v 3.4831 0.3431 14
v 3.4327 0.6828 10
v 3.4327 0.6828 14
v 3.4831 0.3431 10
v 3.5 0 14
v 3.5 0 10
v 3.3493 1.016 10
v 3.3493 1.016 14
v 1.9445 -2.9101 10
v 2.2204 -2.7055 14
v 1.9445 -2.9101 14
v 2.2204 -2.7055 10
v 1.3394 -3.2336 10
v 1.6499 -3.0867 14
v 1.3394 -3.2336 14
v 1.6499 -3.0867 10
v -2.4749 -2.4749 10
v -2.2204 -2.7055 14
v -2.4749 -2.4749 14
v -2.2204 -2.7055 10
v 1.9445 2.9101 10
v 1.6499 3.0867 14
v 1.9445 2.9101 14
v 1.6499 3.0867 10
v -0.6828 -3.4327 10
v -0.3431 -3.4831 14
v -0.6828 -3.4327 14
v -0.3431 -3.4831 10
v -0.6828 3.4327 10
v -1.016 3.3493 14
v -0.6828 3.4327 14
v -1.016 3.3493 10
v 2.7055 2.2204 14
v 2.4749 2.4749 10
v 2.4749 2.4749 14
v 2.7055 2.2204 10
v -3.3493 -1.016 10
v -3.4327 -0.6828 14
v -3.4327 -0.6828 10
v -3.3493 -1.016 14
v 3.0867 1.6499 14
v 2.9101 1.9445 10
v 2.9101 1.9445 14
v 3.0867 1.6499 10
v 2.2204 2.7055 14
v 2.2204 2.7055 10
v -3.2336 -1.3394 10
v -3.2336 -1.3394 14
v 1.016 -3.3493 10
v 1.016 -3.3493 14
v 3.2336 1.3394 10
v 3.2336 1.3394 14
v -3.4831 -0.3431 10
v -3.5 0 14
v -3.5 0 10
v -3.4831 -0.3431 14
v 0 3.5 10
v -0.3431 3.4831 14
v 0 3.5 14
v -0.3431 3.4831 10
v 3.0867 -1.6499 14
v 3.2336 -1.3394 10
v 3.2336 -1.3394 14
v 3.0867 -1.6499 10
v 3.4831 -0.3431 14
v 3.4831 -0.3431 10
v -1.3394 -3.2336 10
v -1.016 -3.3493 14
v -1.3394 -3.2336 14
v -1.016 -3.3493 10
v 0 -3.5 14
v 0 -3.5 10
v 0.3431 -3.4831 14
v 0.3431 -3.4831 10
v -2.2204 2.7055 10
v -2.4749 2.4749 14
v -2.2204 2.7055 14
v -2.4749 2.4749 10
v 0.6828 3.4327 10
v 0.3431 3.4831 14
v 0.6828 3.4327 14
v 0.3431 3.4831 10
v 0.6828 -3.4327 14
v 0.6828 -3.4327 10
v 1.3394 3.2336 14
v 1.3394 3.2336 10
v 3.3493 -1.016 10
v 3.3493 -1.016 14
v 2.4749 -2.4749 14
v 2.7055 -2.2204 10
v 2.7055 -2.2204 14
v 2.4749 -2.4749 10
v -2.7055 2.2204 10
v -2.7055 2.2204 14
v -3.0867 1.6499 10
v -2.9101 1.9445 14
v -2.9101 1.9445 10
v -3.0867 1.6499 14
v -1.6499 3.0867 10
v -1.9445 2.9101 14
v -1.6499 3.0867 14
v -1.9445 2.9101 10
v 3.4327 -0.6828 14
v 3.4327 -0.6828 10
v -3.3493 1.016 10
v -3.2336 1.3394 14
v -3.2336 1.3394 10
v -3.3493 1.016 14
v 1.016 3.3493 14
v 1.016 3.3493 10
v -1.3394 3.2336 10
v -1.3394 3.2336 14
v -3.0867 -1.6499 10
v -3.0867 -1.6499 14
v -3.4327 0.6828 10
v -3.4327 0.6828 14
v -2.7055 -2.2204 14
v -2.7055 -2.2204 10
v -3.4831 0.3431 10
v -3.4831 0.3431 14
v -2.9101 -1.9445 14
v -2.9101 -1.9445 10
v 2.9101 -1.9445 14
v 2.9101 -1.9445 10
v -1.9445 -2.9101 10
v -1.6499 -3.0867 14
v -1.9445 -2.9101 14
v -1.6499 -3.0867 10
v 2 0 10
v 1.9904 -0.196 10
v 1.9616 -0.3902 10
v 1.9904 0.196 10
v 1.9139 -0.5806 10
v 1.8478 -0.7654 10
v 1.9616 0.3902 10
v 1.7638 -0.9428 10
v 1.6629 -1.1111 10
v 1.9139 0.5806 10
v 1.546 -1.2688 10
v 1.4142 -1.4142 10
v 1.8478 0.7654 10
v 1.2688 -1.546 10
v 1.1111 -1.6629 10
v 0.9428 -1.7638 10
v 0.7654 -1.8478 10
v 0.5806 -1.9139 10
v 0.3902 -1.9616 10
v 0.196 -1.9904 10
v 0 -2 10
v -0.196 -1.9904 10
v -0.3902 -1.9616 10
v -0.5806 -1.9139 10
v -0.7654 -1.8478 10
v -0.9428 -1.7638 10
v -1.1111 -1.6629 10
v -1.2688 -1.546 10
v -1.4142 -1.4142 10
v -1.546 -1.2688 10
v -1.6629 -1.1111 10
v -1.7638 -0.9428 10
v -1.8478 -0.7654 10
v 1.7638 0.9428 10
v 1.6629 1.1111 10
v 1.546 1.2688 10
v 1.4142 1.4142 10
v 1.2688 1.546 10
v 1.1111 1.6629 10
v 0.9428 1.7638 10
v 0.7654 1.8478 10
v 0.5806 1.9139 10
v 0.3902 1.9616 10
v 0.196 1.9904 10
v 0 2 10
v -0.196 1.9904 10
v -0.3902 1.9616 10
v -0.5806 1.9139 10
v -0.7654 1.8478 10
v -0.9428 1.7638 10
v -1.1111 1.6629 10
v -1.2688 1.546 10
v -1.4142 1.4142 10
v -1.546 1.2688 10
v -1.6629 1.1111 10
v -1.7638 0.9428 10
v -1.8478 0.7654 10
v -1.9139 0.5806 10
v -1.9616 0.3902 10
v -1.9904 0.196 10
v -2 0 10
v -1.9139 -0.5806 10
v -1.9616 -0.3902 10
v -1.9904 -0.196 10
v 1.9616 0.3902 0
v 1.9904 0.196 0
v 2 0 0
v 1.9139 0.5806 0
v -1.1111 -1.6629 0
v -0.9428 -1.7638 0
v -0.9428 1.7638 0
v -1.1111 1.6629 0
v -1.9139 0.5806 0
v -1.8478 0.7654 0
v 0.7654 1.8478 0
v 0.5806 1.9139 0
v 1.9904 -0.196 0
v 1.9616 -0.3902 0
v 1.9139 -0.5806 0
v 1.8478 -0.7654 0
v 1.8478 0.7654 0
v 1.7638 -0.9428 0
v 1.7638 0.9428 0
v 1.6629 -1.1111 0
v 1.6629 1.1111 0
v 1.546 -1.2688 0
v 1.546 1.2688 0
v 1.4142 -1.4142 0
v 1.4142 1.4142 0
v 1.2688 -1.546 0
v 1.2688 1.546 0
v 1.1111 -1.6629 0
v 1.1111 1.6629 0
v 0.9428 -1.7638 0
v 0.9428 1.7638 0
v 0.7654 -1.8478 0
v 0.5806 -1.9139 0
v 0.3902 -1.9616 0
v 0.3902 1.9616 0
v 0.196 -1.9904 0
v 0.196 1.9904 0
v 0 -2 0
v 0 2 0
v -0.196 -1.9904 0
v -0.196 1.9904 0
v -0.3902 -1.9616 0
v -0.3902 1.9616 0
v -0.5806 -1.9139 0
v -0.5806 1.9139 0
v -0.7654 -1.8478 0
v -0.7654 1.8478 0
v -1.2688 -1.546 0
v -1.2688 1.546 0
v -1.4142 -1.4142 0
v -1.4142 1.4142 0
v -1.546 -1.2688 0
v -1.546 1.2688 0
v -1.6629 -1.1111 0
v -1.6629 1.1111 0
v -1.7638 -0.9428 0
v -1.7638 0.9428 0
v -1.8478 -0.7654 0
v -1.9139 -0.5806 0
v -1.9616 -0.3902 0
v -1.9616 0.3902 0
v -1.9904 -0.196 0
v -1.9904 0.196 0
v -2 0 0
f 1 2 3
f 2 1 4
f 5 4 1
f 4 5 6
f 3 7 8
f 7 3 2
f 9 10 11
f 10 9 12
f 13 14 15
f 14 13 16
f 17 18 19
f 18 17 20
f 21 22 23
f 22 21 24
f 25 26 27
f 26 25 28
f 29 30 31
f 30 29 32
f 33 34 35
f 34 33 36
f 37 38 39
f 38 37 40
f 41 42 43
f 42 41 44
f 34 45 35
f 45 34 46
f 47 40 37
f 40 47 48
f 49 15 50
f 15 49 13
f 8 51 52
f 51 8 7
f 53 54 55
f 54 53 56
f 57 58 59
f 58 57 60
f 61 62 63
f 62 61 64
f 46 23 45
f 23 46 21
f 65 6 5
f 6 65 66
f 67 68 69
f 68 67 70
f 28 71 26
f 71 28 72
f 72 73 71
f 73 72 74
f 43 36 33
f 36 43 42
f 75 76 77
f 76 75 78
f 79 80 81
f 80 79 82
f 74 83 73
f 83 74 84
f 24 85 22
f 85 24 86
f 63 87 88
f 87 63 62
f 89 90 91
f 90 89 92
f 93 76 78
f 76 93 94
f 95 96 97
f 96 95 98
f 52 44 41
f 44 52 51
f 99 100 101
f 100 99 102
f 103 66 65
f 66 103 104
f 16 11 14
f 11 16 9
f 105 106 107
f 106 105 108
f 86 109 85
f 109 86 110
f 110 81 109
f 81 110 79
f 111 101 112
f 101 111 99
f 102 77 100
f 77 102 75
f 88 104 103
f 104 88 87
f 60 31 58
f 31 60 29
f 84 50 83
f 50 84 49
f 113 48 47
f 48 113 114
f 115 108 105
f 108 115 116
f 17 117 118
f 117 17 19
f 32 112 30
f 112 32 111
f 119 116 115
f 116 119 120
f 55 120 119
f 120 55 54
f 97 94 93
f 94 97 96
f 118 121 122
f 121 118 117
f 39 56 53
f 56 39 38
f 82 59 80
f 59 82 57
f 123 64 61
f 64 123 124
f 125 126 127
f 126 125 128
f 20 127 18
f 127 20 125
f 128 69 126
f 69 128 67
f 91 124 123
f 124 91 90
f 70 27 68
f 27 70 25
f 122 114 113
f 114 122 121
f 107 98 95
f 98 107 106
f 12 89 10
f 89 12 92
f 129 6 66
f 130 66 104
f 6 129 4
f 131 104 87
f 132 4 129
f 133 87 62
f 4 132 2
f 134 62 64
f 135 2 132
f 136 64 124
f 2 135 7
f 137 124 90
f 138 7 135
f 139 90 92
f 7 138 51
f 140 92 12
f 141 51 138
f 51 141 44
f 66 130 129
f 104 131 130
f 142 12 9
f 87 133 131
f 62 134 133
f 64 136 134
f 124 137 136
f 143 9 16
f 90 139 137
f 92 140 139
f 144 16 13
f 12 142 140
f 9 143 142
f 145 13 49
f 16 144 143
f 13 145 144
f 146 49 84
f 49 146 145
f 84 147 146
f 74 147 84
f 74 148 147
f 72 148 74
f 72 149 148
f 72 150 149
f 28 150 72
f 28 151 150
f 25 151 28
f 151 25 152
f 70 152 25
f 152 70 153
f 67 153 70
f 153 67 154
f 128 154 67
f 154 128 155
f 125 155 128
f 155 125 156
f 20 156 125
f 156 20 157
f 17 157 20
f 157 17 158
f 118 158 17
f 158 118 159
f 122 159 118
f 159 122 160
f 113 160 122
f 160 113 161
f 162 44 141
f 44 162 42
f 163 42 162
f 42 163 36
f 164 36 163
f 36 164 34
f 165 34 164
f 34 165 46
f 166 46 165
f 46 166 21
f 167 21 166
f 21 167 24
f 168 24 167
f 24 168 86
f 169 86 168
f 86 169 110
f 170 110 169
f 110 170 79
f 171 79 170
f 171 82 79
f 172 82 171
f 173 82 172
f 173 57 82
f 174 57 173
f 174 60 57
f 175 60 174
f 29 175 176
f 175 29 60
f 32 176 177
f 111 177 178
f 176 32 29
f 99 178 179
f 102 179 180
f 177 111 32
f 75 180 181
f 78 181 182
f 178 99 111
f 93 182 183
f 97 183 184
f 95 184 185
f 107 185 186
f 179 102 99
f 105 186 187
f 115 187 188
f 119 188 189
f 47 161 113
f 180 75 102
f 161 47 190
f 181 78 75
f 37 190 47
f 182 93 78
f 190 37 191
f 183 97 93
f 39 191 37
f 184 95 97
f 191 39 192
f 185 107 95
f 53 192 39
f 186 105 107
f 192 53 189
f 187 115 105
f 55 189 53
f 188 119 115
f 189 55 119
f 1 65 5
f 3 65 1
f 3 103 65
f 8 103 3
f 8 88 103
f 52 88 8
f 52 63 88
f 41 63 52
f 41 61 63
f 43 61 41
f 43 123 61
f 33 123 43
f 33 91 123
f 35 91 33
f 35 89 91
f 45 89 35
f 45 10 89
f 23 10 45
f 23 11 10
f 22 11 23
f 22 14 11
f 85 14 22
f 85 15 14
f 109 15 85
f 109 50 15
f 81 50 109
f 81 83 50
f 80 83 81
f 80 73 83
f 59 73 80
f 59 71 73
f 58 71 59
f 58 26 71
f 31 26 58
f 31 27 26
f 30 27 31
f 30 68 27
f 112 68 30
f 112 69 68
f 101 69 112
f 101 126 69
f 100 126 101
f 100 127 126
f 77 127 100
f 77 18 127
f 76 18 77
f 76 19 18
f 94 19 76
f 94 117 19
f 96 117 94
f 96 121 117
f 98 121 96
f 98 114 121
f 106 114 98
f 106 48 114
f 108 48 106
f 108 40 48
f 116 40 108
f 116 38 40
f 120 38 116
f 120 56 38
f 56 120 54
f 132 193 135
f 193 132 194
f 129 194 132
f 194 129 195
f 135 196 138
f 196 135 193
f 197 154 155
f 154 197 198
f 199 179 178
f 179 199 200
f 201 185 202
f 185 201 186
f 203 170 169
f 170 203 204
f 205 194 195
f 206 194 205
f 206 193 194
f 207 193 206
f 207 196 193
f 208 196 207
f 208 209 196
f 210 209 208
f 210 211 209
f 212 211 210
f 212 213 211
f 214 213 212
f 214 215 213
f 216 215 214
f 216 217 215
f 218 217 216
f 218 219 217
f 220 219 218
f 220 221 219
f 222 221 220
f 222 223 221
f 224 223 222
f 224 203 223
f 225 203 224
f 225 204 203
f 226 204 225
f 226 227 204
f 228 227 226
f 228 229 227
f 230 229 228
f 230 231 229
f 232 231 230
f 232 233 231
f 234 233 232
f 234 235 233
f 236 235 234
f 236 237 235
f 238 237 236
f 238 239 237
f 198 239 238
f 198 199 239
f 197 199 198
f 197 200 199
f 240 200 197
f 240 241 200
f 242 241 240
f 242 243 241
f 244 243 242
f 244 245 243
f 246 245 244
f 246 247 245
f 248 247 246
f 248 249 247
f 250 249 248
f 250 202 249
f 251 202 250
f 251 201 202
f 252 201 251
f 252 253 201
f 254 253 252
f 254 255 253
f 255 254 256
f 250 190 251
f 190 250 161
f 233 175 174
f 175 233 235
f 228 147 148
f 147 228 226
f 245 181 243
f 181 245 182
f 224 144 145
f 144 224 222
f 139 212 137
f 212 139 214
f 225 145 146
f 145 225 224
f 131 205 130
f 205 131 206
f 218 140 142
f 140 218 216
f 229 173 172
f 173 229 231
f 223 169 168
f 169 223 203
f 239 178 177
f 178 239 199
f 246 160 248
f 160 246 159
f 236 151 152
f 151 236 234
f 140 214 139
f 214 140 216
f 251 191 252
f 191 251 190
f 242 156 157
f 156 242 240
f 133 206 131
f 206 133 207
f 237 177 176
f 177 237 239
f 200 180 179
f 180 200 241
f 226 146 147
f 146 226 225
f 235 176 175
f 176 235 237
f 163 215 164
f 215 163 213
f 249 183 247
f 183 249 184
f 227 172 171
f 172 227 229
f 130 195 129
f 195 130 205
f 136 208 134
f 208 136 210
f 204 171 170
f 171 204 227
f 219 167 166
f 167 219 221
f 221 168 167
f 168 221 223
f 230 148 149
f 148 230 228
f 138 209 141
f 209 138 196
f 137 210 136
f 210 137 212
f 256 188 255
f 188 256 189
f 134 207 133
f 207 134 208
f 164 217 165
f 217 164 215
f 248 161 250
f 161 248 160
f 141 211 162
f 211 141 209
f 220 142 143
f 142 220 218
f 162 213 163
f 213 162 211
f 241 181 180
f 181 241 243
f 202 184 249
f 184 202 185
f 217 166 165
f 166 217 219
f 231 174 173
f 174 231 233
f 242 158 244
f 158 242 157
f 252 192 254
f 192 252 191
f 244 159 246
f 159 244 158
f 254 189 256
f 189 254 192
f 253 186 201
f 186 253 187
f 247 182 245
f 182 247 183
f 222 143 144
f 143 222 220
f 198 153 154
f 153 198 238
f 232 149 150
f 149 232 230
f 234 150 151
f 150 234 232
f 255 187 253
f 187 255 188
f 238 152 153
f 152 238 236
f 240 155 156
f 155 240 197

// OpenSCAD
module socket_head_cap_screw() {
    union() {
        // Screw head
        translate([0, 0, 10])
            cylinder(h=4.0, d=7.0, $fn=64);
        
        // Screw shaft
        cylinder(h=10, d=4.0, $fn=64);
        
        // Hex socket
        translate([0, 0, 10])
            cylinder(h=4.0, d=3.0, $fn=6);
    }
}

socket_head_cap_screw();
